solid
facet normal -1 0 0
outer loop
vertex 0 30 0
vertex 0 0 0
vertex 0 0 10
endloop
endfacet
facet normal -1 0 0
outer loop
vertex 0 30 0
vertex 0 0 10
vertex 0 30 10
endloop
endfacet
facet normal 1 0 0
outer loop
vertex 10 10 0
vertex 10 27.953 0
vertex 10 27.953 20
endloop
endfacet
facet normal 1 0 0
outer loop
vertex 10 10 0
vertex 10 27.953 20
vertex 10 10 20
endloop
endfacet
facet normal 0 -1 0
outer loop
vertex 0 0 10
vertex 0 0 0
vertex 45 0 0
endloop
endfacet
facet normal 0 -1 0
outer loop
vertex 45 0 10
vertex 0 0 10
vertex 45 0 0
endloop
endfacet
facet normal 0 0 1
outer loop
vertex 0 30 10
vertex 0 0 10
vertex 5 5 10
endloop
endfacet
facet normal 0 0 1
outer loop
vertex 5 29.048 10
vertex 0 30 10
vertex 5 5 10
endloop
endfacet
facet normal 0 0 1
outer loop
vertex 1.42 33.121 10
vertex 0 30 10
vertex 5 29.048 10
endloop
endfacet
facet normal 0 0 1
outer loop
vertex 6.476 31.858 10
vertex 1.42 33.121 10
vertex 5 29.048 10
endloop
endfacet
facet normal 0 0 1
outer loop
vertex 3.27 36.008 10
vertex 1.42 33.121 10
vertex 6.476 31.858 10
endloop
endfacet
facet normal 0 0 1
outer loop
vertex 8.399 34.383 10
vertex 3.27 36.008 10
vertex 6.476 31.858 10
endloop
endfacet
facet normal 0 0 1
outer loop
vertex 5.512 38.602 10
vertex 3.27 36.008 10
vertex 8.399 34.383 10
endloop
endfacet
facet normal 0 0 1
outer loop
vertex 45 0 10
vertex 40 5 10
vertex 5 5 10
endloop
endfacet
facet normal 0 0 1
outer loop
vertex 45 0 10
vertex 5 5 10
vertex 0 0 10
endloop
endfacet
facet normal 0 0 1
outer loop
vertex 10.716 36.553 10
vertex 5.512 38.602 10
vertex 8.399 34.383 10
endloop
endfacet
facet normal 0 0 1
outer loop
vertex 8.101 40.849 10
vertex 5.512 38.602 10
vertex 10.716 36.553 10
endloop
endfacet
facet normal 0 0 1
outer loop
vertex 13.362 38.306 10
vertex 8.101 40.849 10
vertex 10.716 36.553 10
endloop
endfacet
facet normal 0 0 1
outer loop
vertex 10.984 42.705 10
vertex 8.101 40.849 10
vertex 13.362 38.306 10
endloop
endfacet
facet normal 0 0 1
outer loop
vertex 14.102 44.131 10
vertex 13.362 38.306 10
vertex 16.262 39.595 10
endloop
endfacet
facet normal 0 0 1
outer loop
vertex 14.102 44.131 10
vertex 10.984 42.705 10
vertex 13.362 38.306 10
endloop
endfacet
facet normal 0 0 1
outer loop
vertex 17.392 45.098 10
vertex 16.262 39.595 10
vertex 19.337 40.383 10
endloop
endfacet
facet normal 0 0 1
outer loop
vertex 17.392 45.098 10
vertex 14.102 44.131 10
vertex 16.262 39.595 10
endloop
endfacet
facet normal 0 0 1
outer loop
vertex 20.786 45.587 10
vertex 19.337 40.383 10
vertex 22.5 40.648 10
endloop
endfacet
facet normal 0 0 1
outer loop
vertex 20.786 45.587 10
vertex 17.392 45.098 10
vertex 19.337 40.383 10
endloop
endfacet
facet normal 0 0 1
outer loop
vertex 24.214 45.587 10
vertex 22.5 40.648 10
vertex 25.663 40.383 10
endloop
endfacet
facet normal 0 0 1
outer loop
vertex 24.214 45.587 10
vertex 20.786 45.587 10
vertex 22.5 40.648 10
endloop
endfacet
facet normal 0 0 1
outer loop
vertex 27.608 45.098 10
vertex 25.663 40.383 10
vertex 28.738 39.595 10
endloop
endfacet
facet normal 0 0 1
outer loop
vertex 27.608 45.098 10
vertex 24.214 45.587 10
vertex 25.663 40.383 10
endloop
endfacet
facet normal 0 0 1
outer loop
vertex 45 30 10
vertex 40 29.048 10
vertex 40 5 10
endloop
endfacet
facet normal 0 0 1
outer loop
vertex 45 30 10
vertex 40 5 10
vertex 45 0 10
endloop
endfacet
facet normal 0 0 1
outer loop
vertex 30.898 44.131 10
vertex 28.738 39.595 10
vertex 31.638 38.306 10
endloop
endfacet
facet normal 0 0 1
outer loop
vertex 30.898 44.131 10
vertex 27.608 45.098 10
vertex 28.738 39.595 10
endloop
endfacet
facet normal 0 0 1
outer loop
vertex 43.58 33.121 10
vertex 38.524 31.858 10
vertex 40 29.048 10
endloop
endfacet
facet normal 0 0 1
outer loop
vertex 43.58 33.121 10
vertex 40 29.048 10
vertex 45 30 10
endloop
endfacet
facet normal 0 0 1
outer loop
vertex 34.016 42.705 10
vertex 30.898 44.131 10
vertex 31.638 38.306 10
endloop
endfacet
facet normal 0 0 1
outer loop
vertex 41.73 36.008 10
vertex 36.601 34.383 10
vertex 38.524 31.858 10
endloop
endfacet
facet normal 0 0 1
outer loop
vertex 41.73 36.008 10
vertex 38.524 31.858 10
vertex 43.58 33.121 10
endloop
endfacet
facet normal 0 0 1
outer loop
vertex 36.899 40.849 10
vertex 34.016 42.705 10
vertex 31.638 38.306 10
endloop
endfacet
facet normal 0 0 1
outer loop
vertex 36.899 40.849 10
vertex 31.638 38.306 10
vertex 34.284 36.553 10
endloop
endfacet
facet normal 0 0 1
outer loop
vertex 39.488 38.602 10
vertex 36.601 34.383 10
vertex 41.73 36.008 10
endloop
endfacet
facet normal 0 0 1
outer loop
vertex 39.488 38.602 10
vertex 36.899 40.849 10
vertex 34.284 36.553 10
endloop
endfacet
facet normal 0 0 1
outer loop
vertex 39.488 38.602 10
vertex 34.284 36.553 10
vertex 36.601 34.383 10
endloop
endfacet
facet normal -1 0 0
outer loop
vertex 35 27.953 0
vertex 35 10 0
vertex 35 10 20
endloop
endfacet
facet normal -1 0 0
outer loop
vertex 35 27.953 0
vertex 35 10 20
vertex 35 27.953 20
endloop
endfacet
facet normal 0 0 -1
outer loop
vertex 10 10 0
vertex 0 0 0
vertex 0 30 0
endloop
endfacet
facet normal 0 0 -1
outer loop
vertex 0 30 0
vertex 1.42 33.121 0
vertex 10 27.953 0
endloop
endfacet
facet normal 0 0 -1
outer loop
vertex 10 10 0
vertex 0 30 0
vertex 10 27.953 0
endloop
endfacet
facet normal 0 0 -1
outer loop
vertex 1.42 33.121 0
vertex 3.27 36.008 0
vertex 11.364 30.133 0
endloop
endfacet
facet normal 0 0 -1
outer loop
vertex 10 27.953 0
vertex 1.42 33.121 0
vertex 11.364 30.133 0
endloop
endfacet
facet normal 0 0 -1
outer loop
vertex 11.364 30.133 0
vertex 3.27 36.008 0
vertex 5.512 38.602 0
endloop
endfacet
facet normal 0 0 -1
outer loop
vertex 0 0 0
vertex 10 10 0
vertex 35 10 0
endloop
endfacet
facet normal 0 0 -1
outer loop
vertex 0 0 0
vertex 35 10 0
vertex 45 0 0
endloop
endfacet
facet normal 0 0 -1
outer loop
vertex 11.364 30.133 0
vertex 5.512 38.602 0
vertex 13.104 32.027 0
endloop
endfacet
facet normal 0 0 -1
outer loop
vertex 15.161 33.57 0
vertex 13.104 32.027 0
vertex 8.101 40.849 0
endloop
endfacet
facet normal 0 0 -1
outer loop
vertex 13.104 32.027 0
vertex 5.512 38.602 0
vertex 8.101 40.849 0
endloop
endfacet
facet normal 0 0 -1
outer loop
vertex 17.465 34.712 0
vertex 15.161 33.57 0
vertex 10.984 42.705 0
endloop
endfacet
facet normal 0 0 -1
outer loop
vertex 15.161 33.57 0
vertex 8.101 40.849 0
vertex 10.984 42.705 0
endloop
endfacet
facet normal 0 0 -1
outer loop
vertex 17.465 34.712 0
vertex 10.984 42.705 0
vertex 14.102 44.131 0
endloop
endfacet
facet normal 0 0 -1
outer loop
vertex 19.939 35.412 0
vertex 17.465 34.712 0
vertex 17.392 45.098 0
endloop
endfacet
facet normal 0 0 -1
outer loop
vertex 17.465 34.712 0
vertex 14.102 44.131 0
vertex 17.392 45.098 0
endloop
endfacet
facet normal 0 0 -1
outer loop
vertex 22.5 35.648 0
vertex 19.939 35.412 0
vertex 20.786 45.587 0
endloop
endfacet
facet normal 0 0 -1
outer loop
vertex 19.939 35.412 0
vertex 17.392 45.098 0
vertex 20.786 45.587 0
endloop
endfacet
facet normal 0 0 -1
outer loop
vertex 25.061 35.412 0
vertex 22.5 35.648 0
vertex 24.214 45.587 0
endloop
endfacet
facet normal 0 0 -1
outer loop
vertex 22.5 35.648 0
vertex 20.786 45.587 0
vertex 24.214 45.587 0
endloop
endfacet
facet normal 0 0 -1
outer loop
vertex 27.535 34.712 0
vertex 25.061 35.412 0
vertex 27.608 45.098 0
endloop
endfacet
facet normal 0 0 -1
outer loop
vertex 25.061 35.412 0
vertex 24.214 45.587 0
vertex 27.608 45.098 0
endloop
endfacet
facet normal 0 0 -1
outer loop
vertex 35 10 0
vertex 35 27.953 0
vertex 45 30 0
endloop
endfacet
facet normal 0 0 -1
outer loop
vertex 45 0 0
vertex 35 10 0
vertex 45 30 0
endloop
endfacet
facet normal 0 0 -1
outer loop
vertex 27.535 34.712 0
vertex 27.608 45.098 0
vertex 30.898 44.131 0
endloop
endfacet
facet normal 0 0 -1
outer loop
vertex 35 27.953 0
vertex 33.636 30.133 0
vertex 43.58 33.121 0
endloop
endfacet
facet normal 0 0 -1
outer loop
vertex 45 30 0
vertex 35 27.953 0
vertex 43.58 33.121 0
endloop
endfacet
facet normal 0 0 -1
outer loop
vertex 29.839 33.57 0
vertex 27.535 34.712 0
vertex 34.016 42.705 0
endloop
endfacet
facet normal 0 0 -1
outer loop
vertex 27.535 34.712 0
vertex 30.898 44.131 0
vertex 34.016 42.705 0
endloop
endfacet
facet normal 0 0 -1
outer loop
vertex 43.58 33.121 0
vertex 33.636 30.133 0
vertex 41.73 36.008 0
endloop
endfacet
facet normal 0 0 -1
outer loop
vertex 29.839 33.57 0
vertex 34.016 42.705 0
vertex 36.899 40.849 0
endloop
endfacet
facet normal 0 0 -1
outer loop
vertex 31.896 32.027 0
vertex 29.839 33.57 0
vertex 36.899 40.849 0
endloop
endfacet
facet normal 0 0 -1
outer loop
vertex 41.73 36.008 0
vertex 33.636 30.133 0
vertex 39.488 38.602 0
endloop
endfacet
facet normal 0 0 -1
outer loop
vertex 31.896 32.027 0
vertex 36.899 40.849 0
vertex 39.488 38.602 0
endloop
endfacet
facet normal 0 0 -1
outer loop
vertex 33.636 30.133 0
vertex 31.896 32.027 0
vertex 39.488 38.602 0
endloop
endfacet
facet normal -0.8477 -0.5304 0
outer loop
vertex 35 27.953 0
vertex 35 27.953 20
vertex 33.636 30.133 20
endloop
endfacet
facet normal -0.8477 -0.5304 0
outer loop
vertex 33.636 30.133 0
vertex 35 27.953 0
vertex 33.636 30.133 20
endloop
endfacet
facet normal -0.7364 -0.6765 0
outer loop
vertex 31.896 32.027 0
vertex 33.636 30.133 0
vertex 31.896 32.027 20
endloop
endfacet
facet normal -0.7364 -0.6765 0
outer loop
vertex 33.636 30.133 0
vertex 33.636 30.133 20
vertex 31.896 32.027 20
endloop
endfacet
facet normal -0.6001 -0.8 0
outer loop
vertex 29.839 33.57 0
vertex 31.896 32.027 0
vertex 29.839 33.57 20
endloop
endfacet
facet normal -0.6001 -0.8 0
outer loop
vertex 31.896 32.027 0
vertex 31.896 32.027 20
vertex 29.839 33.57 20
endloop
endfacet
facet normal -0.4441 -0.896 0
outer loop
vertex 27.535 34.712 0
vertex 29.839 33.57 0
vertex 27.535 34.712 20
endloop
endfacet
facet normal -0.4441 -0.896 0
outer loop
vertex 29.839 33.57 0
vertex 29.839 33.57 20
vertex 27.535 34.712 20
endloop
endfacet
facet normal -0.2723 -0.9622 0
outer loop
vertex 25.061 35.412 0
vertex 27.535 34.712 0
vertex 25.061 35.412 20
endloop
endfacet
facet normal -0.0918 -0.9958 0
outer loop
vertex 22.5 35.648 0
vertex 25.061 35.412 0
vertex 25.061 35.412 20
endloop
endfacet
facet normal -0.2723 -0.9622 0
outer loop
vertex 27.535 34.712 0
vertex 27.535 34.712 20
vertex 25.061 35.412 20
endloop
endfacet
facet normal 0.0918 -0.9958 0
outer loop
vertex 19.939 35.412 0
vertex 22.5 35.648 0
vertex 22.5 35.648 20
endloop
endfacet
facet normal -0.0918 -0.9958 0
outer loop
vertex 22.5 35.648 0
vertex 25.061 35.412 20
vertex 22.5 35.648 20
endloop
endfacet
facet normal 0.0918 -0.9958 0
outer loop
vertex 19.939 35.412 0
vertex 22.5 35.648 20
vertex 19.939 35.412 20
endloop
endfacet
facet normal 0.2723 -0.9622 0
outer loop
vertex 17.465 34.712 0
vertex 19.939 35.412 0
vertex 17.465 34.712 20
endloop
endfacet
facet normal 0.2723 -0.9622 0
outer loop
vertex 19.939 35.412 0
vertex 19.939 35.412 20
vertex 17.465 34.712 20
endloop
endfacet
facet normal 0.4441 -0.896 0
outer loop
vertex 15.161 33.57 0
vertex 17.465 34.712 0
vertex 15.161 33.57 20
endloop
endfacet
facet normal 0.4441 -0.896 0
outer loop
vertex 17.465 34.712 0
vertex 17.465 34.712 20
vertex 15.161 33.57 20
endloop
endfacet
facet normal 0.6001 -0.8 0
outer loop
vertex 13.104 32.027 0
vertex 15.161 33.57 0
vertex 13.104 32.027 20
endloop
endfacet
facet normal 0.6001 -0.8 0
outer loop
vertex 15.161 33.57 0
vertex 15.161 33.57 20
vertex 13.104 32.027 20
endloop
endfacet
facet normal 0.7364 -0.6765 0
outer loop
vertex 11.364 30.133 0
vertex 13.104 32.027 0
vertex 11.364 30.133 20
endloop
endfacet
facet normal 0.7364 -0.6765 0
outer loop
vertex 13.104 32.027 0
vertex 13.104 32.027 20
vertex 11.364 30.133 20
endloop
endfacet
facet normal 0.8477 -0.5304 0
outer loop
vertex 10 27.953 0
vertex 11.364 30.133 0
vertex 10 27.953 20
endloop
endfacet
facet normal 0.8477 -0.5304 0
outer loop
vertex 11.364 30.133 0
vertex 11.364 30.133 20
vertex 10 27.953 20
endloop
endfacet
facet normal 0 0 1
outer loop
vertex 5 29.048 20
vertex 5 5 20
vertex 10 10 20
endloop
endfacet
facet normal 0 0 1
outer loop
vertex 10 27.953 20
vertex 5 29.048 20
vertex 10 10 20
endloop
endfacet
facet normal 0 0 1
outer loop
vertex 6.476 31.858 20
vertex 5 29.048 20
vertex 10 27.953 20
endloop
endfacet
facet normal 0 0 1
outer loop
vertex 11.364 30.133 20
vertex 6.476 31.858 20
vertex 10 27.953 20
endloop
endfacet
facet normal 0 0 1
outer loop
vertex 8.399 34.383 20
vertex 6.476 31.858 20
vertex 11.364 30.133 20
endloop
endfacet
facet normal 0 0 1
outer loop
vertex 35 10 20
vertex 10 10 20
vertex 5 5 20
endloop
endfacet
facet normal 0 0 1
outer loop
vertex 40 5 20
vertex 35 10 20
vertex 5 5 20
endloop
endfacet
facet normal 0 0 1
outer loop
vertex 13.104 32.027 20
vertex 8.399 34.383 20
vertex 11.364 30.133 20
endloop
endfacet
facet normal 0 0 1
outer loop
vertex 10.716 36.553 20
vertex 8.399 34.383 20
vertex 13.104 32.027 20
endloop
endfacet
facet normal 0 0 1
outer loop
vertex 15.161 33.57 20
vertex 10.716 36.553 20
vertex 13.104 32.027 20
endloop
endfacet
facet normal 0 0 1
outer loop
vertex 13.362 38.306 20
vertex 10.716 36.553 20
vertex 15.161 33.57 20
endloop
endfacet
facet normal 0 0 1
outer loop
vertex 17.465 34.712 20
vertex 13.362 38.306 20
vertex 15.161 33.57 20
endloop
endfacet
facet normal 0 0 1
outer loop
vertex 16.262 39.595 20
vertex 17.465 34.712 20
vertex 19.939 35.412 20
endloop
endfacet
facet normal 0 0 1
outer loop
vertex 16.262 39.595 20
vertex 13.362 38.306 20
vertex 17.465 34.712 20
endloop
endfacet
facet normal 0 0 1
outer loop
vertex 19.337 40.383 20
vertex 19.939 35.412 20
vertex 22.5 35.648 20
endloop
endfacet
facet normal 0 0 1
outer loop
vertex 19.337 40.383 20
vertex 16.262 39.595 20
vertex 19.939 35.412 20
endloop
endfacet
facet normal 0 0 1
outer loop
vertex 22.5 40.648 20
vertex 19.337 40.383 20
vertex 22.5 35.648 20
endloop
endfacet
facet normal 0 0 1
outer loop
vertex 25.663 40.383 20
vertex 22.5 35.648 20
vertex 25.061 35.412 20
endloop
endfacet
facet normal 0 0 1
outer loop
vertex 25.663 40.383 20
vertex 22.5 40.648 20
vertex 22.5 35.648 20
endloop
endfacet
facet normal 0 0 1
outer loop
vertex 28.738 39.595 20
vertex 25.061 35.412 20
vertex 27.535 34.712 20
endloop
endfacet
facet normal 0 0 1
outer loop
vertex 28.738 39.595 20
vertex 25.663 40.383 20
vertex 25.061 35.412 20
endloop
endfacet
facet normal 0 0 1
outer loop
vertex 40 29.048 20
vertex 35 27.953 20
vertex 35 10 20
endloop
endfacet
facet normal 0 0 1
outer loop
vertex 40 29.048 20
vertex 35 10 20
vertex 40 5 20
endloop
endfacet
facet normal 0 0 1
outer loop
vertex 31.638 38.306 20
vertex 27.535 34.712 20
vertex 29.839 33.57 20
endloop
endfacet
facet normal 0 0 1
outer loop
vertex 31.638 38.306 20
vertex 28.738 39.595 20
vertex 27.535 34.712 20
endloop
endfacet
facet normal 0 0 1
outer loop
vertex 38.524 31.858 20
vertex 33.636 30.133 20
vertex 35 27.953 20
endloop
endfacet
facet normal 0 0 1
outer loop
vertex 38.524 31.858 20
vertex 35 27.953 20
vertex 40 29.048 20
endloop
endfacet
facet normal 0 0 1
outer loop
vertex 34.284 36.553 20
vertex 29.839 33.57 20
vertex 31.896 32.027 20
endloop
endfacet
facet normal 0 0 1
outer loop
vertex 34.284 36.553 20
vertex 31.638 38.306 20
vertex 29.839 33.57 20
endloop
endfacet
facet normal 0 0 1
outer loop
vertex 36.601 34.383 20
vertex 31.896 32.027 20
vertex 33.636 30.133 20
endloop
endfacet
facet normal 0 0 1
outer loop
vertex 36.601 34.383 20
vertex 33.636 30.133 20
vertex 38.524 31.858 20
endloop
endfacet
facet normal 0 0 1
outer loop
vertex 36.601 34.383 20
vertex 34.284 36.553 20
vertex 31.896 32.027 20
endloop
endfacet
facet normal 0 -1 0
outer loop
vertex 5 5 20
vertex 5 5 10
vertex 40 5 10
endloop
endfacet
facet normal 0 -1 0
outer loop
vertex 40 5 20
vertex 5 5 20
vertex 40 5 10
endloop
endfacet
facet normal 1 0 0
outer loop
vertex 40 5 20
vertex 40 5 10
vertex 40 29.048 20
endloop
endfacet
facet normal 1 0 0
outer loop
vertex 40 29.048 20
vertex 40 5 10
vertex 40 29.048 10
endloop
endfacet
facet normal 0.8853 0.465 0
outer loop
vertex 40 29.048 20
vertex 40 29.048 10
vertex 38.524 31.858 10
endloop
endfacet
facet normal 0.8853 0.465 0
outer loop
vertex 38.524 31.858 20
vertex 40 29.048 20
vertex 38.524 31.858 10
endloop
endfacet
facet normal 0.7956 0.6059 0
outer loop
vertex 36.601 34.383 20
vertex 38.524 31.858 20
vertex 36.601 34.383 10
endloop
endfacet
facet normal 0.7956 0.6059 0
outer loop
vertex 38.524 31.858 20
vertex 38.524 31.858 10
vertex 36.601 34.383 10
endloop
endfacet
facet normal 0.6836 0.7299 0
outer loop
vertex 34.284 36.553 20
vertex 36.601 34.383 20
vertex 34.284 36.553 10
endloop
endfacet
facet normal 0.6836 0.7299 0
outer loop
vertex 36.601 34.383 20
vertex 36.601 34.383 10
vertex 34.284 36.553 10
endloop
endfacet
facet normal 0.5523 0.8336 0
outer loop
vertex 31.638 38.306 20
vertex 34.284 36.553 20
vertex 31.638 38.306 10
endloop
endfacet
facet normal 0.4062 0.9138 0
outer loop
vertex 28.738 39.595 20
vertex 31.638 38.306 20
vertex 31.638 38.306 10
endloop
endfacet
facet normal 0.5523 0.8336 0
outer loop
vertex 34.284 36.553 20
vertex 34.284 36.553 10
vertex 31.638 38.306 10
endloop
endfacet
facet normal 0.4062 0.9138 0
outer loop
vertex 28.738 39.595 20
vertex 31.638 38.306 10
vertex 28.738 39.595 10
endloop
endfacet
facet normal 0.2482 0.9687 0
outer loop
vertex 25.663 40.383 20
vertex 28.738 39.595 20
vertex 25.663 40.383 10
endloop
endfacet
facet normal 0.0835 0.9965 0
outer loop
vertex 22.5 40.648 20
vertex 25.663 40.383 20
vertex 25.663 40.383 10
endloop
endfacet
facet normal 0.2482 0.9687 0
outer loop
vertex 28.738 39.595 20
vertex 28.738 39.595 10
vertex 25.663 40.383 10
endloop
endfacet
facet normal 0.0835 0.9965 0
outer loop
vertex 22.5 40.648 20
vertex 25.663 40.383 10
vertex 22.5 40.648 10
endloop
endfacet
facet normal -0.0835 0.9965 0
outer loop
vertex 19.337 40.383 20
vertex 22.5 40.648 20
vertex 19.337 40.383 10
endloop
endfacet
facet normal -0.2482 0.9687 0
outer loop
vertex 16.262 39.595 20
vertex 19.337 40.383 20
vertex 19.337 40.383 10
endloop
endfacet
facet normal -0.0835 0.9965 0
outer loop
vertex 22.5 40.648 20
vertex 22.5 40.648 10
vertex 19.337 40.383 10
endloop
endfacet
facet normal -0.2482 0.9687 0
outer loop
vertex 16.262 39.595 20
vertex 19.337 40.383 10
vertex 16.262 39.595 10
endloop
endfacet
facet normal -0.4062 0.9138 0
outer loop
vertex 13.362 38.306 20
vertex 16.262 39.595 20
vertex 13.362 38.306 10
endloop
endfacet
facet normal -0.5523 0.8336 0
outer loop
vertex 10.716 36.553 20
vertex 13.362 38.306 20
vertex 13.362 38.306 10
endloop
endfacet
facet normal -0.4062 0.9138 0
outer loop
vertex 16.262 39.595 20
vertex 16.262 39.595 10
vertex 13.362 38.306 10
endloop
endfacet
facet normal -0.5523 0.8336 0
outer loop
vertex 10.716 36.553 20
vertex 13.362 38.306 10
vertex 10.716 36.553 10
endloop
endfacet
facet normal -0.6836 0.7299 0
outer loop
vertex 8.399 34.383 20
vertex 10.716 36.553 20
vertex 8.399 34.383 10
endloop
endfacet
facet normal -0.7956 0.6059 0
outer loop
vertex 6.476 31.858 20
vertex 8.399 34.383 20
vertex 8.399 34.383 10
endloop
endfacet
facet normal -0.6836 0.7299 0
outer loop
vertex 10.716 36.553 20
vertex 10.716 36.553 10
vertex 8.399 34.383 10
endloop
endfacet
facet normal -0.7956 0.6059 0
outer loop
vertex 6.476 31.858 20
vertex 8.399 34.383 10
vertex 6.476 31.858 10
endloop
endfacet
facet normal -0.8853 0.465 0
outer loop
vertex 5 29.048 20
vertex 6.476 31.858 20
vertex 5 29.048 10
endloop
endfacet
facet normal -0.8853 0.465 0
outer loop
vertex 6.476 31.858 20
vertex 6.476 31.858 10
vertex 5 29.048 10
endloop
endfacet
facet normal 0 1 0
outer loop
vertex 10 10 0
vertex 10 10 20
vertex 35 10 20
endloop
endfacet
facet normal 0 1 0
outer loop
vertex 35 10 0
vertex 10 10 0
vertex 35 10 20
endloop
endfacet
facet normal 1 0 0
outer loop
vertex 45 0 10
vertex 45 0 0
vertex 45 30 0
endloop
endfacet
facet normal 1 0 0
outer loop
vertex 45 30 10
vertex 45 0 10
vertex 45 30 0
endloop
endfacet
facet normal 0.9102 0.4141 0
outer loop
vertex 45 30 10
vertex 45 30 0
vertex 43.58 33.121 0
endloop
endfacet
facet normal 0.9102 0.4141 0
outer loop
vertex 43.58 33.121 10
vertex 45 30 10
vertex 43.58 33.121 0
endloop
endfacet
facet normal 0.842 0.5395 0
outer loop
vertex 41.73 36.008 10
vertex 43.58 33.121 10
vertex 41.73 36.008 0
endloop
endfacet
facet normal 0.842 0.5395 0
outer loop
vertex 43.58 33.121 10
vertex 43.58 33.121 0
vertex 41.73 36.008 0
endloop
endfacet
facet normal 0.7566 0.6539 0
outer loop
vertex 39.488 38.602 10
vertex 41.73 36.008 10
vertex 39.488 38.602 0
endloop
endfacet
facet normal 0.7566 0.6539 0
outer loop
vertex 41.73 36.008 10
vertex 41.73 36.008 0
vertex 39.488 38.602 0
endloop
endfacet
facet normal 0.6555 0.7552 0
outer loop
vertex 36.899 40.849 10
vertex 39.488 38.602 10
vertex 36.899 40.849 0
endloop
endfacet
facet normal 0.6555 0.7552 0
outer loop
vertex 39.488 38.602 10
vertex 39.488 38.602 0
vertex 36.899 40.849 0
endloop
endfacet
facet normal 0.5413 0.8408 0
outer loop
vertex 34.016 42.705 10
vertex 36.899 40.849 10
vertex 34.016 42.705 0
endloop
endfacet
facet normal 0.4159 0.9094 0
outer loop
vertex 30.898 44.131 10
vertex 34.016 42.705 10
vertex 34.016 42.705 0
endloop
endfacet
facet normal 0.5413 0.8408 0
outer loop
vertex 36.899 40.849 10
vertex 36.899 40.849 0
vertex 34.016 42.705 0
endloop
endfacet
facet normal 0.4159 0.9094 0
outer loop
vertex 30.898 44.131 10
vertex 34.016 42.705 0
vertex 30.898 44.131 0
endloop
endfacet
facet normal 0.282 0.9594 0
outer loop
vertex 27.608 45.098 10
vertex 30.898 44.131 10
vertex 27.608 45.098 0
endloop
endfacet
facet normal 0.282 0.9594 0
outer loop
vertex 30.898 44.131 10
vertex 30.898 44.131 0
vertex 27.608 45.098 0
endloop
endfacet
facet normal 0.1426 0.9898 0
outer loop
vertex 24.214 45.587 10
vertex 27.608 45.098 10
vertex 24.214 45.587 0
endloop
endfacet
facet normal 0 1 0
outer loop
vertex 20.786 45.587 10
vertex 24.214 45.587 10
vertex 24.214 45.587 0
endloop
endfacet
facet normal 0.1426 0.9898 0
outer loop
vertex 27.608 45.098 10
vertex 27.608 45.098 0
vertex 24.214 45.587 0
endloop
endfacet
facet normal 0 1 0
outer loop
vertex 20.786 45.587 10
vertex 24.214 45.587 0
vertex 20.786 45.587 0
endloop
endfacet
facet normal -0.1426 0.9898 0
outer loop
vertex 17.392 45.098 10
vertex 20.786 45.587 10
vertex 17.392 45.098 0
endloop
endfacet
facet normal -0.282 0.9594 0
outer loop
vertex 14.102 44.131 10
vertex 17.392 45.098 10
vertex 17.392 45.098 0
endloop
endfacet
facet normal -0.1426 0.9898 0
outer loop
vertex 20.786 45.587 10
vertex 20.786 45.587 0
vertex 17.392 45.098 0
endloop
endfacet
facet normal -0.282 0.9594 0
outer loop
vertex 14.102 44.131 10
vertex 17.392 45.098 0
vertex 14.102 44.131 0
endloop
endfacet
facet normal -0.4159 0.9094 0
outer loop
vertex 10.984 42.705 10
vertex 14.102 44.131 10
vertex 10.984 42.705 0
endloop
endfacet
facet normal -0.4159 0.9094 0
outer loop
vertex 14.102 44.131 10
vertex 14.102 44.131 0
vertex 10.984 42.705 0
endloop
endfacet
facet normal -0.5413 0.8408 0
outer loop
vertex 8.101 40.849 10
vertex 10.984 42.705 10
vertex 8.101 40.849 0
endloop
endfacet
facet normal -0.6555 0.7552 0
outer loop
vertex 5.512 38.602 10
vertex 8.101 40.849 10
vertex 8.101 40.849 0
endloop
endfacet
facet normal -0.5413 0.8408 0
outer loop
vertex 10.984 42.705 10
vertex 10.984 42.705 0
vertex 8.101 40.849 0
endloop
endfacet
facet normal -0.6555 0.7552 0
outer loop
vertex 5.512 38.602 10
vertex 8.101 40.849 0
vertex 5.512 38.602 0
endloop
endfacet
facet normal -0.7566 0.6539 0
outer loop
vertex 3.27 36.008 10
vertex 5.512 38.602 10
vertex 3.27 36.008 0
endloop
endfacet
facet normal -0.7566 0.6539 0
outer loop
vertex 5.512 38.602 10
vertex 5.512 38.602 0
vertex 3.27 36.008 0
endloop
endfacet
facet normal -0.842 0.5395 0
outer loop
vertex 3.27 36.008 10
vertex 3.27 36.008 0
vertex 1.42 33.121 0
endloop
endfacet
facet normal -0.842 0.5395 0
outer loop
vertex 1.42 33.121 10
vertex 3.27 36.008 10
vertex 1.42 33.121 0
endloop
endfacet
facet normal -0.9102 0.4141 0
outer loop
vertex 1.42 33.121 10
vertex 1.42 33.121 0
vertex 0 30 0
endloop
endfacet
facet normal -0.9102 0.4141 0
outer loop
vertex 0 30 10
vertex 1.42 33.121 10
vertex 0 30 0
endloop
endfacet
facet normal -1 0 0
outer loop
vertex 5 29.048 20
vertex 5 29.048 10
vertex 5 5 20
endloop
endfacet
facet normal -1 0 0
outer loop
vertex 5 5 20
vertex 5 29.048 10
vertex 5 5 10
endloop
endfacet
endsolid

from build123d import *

# Parameters (mm, degrees)
F0_W     = 45
F0_H     = 30
F1_DEPTH = 10
F3_DEPTH = 10
F5_DEPTH = 20


with BuildPart() as f1:
    # F0 (on Top) → F1 (new body)
    with BuildSketch(Plane.XY):
        with Locations((22.5, 15)):
            Rectangle(F0_W, F0_H)
        with BuildLine():
            ThreePointArc((45, 30), (22.5, 45.648353), (0, 30))
            Line((0, 30), (45, 30))
        make_face()
    extrude(amount=F1_DEPTH)

    # F2 (on face) → F3 (join)
    with BuildSketch(Plane.XY.offset(10)):
        with BuildLine():
            Line((5, 5), (40, 5))
            Line((40, 5), (40, 29.047678))
            ThreePointArc((40, 29.047678), (22.5, 40.648353), (5, 29.047678))
            Line((5, 29.047678), (5, 5))
        make_face()
    extrude(amount=F3_DEPTH)

    # F4 (on face) → F5 (cut)
    with BuildSketch(Plane.XY.offset(20)):
        with BuildLine():
            Line((10, 27.953114), (10, 10))
            Line((10, 10), (35, 10))
            Line((35, 10), (35, 27.953114))
            ThreePointArc((35, 27.953114), (22.5, 35.648353), (10, 27.953114))
        make_face()
    extrude(amount=-F5_DEPTH, mode=Mode.SUBTRACT)


solid = f1.part
